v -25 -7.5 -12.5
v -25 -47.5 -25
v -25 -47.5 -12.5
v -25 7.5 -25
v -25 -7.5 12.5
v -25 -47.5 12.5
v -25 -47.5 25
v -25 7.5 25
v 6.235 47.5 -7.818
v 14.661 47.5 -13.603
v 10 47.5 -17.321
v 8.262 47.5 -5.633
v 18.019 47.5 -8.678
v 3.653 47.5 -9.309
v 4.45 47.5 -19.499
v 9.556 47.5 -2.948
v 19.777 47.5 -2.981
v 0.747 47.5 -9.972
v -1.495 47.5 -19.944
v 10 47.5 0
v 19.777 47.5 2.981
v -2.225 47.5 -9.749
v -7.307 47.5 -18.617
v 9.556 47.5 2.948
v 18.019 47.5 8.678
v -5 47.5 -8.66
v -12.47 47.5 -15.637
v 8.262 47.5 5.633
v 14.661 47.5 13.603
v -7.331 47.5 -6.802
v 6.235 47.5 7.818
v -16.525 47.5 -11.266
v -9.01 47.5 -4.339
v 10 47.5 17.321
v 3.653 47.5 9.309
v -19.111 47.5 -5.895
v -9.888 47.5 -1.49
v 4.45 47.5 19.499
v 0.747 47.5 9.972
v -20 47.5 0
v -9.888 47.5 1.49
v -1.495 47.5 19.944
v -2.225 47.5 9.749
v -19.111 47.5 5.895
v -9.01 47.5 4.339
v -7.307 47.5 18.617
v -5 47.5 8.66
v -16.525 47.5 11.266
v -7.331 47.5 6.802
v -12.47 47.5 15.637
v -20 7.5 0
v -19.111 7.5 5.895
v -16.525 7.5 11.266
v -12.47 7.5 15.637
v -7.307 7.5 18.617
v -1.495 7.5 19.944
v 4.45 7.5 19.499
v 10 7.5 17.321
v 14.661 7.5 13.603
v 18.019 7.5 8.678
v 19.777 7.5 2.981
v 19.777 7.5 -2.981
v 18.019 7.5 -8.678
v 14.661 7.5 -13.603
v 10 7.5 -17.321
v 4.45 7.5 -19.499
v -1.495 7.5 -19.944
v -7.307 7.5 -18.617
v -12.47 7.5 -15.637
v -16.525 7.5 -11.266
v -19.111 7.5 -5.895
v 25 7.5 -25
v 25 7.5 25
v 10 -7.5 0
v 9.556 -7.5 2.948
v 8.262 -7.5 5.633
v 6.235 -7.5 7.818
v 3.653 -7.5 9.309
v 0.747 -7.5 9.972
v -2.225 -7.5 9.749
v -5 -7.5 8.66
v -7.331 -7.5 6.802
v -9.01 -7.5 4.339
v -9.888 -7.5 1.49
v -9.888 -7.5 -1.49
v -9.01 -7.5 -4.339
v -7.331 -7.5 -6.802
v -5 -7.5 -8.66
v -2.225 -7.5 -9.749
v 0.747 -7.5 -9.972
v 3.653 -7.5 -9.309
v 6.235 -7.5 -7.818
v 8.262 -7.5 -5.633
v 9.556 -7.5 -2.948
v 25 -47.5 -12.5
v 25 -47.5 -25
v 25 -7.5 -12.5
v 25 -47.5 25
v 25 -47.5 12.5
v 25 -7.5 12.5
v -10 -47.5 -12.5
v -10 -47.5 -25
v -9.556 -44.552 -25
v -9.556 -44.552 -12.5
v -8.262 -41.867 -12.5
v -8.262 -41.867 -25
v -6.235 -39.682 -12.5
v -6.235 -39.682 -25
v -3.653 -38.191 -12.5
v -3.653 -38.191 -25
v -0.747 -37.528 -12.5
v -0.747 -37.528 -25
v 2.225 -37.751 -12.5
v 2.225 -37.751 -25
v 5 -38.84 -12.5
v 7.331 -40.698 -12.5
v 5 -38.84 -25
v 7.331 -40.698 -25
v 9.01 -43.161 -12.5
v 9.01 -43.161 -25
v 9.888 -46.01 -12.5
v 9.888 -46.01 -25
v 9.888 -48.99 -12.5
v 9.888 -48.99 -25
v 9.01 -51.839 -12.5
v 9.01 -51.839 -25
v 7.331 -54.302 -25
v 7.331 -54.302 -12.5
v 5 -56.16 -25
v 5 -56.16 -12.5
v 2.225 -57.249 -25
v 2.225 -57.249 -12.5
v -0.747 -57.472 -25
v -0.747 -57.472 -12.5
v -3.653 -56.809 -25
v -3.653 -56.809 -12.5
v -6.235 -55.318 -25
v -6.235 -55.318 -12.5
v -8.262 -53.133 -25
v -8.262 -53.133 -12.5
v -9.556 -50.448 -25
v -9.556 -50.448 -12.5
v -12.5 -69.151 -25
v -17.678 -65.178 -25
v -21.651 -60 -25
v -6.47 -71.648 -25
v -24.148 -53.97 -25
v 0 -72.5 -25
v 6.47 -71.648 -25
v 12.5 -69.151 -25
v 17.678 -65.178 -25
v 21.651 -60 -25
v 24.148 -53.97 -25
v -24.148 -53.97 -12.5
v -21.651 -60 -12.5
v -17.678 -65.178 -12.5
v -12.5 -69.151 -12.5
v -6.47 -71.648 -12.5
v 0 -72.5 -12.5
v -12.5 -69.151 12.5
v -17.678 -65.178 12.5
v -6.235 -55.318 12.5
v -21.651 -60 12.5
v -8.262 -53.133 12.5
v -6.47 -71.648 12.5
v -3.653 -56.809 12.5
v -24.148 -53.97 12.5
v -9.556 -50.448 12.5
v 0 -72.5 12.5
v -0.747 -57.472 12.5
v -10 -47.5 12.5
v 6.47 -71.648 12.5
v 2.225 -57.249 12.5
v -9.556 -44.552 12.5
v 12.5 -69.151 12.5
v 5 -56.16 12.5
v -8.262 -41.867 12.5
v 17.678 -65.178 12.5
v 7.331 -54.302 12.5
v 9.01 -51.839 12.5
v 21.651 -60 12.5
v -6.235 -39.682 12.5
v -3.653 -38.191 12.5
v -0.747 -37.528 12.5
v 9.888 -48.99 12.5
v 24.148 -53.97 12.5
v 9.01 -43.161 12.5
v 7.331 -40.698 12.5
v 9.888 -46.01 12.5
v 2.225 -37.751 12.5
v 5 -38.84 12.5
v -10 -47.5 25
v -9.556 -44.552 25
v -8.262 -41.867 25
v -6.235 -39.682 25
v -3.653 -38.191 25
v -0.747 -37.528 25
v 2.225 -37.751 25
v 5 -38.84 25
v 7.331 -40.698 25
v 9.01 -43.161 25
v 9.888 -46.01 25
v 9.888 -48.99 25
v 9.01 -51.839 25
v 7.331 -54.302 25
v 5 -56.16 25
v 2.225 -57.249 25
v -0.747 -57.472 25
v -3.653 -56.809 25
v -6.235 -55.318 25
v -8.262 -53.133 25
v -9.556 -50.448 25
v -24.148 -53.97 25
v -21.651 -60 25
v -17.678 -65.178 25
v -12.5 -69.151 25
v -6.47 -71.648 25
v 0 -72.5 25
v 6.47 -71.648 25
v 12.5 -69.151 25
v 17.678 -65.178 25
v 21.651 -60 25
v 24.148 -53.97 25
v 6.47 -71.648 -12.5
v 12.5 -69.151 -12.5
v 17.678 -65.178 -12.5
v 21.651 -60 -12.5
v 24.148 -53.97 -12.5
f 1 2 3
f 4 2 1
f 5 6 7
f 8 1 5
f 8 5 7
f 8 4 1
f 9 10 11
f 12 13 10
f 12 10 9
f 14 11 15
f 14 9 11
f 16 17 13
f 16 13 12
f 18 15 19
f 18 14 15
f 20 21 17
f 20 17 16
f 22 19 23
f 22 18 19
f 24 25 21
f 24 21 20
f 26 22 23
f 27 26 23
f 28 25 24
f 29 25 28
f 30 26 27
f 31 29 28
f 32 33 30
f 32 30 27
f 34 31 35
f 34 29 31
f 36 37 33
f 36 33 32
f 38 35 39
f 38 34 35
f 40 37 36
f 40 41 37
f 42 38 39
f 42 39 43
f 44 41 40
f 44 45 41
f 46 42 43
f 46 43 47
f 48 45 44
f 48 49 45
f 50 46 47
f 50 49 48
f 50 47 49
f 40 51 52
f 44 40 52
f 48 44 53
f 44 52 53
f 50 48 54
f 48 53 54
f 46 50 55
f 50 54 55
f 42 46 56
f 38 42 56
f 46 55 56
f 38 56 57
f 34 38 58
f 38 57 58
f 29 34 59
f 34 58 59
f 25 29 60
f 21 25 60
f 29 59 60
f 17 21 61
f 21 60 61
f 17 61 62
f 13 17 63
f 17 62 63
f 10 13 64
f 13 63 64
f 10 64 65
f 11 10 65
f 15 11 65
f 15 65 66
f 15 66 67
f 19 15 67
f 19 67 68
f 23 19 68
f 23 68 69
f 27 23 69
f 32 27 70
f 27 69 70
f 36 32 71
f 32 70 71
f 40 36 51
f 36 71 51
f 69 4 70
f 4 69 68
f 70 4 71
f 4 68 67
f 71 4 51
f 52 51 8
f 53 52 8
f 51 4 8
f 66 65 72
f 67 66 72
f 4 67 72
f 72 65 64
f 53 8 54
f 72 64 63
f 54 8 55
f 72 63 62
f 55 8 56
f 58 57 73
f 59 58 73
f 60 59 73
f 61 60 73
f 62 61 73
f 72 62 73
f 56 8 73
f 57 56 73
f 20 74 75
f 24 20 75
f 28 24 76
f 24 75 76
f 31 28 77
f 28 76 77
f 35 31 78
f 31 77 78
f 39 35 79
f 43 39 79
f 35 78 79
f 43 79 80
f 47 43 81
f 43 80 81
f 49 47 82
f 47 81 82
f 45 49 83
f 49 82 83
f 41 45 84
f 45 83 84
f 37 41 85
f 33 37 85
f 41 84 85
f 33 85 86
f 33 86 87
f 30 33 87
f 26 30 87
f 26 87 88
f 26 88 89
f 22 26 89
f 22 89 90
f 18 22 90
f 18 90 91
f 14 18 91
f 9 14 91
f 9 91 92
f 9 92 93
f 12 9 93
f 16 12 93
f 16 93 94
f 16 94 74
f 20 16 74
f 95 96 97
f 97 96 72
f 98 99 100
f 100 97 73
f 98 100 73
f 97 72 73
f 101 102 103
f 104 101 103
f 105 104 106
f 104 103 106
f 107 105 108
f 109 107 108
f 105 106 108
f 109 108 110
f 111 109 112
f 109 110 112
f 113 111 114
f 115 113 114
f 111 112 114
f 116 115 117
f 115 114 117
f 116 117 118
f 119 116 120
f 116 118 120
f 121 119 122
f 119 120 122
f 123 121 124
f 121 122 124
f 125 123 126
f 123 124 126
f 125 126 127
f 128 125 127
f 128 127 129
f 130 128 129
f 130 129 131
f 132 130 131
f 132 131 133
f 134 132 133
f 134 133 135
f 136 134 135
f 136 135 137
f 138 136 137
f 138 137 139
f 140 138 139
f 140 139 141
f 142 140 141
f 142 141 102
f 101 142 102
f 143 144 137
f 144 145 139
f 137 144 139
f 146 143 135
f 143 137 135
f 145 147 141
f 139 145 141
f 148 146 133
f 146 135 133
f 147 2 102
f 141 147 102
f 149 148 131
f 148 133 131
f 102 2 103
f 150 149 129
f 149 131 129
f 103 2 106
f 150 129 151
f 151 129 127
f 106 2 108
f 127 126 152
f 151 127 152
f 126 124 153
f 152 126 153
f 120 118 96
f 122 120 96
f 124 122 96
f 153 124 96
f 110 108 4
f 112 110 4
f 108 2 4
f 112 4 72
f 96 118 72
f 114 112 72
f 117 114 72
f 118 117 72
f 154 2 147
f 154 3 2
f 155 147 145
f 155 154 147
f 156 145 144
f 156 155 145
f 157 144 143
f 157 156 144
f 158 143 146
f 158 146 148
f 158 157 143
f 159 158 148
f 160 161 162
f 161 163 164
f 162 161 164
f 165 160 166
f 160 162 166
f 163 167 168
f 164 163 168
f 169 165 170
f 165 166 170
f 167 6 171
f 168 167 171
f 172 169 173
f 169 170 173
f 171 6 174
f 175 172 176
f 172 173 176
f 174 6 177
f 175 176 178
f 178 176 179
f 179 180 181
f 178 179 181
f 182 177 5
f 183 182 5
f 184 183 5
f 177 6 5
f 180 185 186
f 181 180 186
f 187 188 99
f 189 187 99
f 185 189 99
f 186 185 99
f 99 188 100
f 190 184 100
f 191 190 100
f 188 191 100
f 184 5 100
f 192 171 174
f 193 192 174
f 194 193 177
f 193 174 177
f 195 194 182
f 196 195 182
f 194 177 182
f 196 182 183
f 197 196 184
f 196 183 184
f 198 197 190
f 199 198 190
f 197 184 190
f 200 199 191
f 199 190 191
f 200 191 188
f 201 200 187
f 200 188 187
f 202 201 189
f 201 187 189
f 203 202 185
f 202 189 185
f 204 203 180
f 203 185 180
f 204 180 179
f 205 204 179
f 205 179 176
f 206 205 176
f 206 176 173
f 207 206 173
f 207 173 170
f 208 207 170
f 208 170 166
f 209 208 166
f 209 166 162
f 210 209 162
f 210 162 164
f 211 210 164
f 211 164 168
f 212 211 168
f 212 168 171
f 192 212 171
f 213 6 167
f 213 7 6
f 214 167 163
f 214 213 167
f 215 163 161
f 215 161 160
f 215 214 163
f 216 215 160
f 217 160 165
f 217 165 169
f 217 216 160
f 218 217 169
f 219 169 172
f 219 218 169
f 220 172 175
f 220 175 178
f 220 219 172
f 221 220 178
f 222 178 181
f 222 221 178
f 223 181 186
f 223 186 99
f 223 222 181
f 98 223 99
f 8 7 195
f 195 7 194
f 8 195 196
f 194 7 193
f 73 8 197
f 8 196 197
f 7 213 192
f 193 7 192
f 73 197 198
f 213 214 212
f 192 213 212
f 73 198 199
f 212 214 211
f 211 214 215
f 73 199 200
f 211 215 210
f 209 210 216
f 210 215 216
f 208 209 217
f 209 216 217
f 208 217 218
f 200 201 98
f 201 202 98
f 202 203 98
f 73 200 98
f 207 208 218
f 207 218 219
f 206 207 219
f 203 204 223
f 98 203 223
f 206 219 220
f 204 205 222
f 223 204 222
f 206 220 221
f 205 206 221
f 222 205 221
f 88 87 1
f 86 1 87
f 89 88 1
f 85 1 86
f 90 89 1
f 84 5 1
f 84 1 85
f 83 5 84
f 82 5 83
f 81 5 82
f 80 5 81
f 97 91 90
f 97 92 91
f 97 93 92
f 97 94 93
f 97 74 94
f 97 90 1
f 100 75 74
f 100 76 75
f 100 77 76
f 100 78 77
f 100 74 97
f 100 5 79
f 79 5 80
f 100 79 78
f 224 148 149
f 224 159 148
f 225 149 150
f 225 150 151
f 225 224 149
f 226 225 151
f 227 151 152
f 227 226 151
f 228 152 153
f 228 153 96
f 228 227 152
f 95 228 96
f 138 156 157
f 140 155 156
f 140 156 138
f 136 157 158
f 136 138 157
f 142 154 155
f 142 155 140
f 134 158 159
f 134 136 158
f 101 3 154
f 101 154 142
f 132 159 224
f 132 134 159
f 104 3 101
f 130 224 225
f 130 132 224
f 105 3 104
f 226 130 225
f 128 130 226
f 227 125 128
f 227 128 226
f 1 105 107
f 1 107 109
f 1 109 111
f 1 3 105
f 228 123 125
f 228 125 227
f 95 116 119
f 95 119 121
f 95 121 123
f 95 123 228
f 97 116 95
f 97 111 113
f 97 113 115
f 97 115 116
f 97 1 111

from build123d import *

# Parameters (mm, degrees)
F0_W     = 50
F0_H     = 50
F1_DEPTH = 7.5
F2_W     = 50
F2_H     = 12.5
F3_DEPTH = 65
F5_D     = 20
F6_R     = 25
F7_R     = 24.99999
F8_R     = 20
F9_DEPTH = 40
F11_D    = 20


# Not quite as in the source:
# - a fillet or chamfer is up to 0.001 mm smaller than in the source, because OpenCascade refuses the exact size


with BuildPart() as f1:
    # F0 (on Front) → F1 (new body, symmetric)
    with BuildSketch(Plane.XZ):
        Rectangle(F0_W, F0_H)
    extrude(amount=F1_DEPTH, both=True)

    # F2 (on face) → F3 (join)
    with BuildSketch(Plane.XZ.offset(7.5)):
        with Locations((0, -18.75)):
            Rectangle(F2_W, F2_H)
        with Locations((0, 18.75)):
            Rectangle(F2_W, F2_H)
    extrude(amount=F3_DEPTH)

    # F5 (through all)
    with Locations(Plane.XY.offset(25)):
        with Locations((0, -47.5)):
            Hole(F5_D / 2)

    # F6
    f6_edges = [f1.edges().sort_by_distance(p)[0] for p in [
        (-25, -72.5, -18.75),
    ]]
    fillet(f6_edges, radius=F6_R)

    # F7 (radius 25 in the source; OpenCascade refuses exactly that, so slightly less here)
    f7_edges = [f1.edges().sort_by_distance(p)[0] for p in [
        (25, -72.5, 18.75),
        (25, -72.5, -18.75),
        (-25, -72.5, 18.75),
    ]]
    fillet(f7_edges, radius=F7_R)

    # F8 (on face) → F9 (join)
    with BuildSketch(Plane(origin=(0, 7.5, 0), x_dir=(-1, 0, 0), z_dir=(0, 1, 0))):
        Circle(F8_R)
    extrude(amount=F9_DEPTH)

    # F11 (through all)
    with Locations(Plane(origin=(0, 47.5, 0), x_dir=(-1, 0, 0), z_dir=(0, 1, 0))):
        with Locations((0, 0)):
            Hole(F11_D / 2)


solid = f1.part
